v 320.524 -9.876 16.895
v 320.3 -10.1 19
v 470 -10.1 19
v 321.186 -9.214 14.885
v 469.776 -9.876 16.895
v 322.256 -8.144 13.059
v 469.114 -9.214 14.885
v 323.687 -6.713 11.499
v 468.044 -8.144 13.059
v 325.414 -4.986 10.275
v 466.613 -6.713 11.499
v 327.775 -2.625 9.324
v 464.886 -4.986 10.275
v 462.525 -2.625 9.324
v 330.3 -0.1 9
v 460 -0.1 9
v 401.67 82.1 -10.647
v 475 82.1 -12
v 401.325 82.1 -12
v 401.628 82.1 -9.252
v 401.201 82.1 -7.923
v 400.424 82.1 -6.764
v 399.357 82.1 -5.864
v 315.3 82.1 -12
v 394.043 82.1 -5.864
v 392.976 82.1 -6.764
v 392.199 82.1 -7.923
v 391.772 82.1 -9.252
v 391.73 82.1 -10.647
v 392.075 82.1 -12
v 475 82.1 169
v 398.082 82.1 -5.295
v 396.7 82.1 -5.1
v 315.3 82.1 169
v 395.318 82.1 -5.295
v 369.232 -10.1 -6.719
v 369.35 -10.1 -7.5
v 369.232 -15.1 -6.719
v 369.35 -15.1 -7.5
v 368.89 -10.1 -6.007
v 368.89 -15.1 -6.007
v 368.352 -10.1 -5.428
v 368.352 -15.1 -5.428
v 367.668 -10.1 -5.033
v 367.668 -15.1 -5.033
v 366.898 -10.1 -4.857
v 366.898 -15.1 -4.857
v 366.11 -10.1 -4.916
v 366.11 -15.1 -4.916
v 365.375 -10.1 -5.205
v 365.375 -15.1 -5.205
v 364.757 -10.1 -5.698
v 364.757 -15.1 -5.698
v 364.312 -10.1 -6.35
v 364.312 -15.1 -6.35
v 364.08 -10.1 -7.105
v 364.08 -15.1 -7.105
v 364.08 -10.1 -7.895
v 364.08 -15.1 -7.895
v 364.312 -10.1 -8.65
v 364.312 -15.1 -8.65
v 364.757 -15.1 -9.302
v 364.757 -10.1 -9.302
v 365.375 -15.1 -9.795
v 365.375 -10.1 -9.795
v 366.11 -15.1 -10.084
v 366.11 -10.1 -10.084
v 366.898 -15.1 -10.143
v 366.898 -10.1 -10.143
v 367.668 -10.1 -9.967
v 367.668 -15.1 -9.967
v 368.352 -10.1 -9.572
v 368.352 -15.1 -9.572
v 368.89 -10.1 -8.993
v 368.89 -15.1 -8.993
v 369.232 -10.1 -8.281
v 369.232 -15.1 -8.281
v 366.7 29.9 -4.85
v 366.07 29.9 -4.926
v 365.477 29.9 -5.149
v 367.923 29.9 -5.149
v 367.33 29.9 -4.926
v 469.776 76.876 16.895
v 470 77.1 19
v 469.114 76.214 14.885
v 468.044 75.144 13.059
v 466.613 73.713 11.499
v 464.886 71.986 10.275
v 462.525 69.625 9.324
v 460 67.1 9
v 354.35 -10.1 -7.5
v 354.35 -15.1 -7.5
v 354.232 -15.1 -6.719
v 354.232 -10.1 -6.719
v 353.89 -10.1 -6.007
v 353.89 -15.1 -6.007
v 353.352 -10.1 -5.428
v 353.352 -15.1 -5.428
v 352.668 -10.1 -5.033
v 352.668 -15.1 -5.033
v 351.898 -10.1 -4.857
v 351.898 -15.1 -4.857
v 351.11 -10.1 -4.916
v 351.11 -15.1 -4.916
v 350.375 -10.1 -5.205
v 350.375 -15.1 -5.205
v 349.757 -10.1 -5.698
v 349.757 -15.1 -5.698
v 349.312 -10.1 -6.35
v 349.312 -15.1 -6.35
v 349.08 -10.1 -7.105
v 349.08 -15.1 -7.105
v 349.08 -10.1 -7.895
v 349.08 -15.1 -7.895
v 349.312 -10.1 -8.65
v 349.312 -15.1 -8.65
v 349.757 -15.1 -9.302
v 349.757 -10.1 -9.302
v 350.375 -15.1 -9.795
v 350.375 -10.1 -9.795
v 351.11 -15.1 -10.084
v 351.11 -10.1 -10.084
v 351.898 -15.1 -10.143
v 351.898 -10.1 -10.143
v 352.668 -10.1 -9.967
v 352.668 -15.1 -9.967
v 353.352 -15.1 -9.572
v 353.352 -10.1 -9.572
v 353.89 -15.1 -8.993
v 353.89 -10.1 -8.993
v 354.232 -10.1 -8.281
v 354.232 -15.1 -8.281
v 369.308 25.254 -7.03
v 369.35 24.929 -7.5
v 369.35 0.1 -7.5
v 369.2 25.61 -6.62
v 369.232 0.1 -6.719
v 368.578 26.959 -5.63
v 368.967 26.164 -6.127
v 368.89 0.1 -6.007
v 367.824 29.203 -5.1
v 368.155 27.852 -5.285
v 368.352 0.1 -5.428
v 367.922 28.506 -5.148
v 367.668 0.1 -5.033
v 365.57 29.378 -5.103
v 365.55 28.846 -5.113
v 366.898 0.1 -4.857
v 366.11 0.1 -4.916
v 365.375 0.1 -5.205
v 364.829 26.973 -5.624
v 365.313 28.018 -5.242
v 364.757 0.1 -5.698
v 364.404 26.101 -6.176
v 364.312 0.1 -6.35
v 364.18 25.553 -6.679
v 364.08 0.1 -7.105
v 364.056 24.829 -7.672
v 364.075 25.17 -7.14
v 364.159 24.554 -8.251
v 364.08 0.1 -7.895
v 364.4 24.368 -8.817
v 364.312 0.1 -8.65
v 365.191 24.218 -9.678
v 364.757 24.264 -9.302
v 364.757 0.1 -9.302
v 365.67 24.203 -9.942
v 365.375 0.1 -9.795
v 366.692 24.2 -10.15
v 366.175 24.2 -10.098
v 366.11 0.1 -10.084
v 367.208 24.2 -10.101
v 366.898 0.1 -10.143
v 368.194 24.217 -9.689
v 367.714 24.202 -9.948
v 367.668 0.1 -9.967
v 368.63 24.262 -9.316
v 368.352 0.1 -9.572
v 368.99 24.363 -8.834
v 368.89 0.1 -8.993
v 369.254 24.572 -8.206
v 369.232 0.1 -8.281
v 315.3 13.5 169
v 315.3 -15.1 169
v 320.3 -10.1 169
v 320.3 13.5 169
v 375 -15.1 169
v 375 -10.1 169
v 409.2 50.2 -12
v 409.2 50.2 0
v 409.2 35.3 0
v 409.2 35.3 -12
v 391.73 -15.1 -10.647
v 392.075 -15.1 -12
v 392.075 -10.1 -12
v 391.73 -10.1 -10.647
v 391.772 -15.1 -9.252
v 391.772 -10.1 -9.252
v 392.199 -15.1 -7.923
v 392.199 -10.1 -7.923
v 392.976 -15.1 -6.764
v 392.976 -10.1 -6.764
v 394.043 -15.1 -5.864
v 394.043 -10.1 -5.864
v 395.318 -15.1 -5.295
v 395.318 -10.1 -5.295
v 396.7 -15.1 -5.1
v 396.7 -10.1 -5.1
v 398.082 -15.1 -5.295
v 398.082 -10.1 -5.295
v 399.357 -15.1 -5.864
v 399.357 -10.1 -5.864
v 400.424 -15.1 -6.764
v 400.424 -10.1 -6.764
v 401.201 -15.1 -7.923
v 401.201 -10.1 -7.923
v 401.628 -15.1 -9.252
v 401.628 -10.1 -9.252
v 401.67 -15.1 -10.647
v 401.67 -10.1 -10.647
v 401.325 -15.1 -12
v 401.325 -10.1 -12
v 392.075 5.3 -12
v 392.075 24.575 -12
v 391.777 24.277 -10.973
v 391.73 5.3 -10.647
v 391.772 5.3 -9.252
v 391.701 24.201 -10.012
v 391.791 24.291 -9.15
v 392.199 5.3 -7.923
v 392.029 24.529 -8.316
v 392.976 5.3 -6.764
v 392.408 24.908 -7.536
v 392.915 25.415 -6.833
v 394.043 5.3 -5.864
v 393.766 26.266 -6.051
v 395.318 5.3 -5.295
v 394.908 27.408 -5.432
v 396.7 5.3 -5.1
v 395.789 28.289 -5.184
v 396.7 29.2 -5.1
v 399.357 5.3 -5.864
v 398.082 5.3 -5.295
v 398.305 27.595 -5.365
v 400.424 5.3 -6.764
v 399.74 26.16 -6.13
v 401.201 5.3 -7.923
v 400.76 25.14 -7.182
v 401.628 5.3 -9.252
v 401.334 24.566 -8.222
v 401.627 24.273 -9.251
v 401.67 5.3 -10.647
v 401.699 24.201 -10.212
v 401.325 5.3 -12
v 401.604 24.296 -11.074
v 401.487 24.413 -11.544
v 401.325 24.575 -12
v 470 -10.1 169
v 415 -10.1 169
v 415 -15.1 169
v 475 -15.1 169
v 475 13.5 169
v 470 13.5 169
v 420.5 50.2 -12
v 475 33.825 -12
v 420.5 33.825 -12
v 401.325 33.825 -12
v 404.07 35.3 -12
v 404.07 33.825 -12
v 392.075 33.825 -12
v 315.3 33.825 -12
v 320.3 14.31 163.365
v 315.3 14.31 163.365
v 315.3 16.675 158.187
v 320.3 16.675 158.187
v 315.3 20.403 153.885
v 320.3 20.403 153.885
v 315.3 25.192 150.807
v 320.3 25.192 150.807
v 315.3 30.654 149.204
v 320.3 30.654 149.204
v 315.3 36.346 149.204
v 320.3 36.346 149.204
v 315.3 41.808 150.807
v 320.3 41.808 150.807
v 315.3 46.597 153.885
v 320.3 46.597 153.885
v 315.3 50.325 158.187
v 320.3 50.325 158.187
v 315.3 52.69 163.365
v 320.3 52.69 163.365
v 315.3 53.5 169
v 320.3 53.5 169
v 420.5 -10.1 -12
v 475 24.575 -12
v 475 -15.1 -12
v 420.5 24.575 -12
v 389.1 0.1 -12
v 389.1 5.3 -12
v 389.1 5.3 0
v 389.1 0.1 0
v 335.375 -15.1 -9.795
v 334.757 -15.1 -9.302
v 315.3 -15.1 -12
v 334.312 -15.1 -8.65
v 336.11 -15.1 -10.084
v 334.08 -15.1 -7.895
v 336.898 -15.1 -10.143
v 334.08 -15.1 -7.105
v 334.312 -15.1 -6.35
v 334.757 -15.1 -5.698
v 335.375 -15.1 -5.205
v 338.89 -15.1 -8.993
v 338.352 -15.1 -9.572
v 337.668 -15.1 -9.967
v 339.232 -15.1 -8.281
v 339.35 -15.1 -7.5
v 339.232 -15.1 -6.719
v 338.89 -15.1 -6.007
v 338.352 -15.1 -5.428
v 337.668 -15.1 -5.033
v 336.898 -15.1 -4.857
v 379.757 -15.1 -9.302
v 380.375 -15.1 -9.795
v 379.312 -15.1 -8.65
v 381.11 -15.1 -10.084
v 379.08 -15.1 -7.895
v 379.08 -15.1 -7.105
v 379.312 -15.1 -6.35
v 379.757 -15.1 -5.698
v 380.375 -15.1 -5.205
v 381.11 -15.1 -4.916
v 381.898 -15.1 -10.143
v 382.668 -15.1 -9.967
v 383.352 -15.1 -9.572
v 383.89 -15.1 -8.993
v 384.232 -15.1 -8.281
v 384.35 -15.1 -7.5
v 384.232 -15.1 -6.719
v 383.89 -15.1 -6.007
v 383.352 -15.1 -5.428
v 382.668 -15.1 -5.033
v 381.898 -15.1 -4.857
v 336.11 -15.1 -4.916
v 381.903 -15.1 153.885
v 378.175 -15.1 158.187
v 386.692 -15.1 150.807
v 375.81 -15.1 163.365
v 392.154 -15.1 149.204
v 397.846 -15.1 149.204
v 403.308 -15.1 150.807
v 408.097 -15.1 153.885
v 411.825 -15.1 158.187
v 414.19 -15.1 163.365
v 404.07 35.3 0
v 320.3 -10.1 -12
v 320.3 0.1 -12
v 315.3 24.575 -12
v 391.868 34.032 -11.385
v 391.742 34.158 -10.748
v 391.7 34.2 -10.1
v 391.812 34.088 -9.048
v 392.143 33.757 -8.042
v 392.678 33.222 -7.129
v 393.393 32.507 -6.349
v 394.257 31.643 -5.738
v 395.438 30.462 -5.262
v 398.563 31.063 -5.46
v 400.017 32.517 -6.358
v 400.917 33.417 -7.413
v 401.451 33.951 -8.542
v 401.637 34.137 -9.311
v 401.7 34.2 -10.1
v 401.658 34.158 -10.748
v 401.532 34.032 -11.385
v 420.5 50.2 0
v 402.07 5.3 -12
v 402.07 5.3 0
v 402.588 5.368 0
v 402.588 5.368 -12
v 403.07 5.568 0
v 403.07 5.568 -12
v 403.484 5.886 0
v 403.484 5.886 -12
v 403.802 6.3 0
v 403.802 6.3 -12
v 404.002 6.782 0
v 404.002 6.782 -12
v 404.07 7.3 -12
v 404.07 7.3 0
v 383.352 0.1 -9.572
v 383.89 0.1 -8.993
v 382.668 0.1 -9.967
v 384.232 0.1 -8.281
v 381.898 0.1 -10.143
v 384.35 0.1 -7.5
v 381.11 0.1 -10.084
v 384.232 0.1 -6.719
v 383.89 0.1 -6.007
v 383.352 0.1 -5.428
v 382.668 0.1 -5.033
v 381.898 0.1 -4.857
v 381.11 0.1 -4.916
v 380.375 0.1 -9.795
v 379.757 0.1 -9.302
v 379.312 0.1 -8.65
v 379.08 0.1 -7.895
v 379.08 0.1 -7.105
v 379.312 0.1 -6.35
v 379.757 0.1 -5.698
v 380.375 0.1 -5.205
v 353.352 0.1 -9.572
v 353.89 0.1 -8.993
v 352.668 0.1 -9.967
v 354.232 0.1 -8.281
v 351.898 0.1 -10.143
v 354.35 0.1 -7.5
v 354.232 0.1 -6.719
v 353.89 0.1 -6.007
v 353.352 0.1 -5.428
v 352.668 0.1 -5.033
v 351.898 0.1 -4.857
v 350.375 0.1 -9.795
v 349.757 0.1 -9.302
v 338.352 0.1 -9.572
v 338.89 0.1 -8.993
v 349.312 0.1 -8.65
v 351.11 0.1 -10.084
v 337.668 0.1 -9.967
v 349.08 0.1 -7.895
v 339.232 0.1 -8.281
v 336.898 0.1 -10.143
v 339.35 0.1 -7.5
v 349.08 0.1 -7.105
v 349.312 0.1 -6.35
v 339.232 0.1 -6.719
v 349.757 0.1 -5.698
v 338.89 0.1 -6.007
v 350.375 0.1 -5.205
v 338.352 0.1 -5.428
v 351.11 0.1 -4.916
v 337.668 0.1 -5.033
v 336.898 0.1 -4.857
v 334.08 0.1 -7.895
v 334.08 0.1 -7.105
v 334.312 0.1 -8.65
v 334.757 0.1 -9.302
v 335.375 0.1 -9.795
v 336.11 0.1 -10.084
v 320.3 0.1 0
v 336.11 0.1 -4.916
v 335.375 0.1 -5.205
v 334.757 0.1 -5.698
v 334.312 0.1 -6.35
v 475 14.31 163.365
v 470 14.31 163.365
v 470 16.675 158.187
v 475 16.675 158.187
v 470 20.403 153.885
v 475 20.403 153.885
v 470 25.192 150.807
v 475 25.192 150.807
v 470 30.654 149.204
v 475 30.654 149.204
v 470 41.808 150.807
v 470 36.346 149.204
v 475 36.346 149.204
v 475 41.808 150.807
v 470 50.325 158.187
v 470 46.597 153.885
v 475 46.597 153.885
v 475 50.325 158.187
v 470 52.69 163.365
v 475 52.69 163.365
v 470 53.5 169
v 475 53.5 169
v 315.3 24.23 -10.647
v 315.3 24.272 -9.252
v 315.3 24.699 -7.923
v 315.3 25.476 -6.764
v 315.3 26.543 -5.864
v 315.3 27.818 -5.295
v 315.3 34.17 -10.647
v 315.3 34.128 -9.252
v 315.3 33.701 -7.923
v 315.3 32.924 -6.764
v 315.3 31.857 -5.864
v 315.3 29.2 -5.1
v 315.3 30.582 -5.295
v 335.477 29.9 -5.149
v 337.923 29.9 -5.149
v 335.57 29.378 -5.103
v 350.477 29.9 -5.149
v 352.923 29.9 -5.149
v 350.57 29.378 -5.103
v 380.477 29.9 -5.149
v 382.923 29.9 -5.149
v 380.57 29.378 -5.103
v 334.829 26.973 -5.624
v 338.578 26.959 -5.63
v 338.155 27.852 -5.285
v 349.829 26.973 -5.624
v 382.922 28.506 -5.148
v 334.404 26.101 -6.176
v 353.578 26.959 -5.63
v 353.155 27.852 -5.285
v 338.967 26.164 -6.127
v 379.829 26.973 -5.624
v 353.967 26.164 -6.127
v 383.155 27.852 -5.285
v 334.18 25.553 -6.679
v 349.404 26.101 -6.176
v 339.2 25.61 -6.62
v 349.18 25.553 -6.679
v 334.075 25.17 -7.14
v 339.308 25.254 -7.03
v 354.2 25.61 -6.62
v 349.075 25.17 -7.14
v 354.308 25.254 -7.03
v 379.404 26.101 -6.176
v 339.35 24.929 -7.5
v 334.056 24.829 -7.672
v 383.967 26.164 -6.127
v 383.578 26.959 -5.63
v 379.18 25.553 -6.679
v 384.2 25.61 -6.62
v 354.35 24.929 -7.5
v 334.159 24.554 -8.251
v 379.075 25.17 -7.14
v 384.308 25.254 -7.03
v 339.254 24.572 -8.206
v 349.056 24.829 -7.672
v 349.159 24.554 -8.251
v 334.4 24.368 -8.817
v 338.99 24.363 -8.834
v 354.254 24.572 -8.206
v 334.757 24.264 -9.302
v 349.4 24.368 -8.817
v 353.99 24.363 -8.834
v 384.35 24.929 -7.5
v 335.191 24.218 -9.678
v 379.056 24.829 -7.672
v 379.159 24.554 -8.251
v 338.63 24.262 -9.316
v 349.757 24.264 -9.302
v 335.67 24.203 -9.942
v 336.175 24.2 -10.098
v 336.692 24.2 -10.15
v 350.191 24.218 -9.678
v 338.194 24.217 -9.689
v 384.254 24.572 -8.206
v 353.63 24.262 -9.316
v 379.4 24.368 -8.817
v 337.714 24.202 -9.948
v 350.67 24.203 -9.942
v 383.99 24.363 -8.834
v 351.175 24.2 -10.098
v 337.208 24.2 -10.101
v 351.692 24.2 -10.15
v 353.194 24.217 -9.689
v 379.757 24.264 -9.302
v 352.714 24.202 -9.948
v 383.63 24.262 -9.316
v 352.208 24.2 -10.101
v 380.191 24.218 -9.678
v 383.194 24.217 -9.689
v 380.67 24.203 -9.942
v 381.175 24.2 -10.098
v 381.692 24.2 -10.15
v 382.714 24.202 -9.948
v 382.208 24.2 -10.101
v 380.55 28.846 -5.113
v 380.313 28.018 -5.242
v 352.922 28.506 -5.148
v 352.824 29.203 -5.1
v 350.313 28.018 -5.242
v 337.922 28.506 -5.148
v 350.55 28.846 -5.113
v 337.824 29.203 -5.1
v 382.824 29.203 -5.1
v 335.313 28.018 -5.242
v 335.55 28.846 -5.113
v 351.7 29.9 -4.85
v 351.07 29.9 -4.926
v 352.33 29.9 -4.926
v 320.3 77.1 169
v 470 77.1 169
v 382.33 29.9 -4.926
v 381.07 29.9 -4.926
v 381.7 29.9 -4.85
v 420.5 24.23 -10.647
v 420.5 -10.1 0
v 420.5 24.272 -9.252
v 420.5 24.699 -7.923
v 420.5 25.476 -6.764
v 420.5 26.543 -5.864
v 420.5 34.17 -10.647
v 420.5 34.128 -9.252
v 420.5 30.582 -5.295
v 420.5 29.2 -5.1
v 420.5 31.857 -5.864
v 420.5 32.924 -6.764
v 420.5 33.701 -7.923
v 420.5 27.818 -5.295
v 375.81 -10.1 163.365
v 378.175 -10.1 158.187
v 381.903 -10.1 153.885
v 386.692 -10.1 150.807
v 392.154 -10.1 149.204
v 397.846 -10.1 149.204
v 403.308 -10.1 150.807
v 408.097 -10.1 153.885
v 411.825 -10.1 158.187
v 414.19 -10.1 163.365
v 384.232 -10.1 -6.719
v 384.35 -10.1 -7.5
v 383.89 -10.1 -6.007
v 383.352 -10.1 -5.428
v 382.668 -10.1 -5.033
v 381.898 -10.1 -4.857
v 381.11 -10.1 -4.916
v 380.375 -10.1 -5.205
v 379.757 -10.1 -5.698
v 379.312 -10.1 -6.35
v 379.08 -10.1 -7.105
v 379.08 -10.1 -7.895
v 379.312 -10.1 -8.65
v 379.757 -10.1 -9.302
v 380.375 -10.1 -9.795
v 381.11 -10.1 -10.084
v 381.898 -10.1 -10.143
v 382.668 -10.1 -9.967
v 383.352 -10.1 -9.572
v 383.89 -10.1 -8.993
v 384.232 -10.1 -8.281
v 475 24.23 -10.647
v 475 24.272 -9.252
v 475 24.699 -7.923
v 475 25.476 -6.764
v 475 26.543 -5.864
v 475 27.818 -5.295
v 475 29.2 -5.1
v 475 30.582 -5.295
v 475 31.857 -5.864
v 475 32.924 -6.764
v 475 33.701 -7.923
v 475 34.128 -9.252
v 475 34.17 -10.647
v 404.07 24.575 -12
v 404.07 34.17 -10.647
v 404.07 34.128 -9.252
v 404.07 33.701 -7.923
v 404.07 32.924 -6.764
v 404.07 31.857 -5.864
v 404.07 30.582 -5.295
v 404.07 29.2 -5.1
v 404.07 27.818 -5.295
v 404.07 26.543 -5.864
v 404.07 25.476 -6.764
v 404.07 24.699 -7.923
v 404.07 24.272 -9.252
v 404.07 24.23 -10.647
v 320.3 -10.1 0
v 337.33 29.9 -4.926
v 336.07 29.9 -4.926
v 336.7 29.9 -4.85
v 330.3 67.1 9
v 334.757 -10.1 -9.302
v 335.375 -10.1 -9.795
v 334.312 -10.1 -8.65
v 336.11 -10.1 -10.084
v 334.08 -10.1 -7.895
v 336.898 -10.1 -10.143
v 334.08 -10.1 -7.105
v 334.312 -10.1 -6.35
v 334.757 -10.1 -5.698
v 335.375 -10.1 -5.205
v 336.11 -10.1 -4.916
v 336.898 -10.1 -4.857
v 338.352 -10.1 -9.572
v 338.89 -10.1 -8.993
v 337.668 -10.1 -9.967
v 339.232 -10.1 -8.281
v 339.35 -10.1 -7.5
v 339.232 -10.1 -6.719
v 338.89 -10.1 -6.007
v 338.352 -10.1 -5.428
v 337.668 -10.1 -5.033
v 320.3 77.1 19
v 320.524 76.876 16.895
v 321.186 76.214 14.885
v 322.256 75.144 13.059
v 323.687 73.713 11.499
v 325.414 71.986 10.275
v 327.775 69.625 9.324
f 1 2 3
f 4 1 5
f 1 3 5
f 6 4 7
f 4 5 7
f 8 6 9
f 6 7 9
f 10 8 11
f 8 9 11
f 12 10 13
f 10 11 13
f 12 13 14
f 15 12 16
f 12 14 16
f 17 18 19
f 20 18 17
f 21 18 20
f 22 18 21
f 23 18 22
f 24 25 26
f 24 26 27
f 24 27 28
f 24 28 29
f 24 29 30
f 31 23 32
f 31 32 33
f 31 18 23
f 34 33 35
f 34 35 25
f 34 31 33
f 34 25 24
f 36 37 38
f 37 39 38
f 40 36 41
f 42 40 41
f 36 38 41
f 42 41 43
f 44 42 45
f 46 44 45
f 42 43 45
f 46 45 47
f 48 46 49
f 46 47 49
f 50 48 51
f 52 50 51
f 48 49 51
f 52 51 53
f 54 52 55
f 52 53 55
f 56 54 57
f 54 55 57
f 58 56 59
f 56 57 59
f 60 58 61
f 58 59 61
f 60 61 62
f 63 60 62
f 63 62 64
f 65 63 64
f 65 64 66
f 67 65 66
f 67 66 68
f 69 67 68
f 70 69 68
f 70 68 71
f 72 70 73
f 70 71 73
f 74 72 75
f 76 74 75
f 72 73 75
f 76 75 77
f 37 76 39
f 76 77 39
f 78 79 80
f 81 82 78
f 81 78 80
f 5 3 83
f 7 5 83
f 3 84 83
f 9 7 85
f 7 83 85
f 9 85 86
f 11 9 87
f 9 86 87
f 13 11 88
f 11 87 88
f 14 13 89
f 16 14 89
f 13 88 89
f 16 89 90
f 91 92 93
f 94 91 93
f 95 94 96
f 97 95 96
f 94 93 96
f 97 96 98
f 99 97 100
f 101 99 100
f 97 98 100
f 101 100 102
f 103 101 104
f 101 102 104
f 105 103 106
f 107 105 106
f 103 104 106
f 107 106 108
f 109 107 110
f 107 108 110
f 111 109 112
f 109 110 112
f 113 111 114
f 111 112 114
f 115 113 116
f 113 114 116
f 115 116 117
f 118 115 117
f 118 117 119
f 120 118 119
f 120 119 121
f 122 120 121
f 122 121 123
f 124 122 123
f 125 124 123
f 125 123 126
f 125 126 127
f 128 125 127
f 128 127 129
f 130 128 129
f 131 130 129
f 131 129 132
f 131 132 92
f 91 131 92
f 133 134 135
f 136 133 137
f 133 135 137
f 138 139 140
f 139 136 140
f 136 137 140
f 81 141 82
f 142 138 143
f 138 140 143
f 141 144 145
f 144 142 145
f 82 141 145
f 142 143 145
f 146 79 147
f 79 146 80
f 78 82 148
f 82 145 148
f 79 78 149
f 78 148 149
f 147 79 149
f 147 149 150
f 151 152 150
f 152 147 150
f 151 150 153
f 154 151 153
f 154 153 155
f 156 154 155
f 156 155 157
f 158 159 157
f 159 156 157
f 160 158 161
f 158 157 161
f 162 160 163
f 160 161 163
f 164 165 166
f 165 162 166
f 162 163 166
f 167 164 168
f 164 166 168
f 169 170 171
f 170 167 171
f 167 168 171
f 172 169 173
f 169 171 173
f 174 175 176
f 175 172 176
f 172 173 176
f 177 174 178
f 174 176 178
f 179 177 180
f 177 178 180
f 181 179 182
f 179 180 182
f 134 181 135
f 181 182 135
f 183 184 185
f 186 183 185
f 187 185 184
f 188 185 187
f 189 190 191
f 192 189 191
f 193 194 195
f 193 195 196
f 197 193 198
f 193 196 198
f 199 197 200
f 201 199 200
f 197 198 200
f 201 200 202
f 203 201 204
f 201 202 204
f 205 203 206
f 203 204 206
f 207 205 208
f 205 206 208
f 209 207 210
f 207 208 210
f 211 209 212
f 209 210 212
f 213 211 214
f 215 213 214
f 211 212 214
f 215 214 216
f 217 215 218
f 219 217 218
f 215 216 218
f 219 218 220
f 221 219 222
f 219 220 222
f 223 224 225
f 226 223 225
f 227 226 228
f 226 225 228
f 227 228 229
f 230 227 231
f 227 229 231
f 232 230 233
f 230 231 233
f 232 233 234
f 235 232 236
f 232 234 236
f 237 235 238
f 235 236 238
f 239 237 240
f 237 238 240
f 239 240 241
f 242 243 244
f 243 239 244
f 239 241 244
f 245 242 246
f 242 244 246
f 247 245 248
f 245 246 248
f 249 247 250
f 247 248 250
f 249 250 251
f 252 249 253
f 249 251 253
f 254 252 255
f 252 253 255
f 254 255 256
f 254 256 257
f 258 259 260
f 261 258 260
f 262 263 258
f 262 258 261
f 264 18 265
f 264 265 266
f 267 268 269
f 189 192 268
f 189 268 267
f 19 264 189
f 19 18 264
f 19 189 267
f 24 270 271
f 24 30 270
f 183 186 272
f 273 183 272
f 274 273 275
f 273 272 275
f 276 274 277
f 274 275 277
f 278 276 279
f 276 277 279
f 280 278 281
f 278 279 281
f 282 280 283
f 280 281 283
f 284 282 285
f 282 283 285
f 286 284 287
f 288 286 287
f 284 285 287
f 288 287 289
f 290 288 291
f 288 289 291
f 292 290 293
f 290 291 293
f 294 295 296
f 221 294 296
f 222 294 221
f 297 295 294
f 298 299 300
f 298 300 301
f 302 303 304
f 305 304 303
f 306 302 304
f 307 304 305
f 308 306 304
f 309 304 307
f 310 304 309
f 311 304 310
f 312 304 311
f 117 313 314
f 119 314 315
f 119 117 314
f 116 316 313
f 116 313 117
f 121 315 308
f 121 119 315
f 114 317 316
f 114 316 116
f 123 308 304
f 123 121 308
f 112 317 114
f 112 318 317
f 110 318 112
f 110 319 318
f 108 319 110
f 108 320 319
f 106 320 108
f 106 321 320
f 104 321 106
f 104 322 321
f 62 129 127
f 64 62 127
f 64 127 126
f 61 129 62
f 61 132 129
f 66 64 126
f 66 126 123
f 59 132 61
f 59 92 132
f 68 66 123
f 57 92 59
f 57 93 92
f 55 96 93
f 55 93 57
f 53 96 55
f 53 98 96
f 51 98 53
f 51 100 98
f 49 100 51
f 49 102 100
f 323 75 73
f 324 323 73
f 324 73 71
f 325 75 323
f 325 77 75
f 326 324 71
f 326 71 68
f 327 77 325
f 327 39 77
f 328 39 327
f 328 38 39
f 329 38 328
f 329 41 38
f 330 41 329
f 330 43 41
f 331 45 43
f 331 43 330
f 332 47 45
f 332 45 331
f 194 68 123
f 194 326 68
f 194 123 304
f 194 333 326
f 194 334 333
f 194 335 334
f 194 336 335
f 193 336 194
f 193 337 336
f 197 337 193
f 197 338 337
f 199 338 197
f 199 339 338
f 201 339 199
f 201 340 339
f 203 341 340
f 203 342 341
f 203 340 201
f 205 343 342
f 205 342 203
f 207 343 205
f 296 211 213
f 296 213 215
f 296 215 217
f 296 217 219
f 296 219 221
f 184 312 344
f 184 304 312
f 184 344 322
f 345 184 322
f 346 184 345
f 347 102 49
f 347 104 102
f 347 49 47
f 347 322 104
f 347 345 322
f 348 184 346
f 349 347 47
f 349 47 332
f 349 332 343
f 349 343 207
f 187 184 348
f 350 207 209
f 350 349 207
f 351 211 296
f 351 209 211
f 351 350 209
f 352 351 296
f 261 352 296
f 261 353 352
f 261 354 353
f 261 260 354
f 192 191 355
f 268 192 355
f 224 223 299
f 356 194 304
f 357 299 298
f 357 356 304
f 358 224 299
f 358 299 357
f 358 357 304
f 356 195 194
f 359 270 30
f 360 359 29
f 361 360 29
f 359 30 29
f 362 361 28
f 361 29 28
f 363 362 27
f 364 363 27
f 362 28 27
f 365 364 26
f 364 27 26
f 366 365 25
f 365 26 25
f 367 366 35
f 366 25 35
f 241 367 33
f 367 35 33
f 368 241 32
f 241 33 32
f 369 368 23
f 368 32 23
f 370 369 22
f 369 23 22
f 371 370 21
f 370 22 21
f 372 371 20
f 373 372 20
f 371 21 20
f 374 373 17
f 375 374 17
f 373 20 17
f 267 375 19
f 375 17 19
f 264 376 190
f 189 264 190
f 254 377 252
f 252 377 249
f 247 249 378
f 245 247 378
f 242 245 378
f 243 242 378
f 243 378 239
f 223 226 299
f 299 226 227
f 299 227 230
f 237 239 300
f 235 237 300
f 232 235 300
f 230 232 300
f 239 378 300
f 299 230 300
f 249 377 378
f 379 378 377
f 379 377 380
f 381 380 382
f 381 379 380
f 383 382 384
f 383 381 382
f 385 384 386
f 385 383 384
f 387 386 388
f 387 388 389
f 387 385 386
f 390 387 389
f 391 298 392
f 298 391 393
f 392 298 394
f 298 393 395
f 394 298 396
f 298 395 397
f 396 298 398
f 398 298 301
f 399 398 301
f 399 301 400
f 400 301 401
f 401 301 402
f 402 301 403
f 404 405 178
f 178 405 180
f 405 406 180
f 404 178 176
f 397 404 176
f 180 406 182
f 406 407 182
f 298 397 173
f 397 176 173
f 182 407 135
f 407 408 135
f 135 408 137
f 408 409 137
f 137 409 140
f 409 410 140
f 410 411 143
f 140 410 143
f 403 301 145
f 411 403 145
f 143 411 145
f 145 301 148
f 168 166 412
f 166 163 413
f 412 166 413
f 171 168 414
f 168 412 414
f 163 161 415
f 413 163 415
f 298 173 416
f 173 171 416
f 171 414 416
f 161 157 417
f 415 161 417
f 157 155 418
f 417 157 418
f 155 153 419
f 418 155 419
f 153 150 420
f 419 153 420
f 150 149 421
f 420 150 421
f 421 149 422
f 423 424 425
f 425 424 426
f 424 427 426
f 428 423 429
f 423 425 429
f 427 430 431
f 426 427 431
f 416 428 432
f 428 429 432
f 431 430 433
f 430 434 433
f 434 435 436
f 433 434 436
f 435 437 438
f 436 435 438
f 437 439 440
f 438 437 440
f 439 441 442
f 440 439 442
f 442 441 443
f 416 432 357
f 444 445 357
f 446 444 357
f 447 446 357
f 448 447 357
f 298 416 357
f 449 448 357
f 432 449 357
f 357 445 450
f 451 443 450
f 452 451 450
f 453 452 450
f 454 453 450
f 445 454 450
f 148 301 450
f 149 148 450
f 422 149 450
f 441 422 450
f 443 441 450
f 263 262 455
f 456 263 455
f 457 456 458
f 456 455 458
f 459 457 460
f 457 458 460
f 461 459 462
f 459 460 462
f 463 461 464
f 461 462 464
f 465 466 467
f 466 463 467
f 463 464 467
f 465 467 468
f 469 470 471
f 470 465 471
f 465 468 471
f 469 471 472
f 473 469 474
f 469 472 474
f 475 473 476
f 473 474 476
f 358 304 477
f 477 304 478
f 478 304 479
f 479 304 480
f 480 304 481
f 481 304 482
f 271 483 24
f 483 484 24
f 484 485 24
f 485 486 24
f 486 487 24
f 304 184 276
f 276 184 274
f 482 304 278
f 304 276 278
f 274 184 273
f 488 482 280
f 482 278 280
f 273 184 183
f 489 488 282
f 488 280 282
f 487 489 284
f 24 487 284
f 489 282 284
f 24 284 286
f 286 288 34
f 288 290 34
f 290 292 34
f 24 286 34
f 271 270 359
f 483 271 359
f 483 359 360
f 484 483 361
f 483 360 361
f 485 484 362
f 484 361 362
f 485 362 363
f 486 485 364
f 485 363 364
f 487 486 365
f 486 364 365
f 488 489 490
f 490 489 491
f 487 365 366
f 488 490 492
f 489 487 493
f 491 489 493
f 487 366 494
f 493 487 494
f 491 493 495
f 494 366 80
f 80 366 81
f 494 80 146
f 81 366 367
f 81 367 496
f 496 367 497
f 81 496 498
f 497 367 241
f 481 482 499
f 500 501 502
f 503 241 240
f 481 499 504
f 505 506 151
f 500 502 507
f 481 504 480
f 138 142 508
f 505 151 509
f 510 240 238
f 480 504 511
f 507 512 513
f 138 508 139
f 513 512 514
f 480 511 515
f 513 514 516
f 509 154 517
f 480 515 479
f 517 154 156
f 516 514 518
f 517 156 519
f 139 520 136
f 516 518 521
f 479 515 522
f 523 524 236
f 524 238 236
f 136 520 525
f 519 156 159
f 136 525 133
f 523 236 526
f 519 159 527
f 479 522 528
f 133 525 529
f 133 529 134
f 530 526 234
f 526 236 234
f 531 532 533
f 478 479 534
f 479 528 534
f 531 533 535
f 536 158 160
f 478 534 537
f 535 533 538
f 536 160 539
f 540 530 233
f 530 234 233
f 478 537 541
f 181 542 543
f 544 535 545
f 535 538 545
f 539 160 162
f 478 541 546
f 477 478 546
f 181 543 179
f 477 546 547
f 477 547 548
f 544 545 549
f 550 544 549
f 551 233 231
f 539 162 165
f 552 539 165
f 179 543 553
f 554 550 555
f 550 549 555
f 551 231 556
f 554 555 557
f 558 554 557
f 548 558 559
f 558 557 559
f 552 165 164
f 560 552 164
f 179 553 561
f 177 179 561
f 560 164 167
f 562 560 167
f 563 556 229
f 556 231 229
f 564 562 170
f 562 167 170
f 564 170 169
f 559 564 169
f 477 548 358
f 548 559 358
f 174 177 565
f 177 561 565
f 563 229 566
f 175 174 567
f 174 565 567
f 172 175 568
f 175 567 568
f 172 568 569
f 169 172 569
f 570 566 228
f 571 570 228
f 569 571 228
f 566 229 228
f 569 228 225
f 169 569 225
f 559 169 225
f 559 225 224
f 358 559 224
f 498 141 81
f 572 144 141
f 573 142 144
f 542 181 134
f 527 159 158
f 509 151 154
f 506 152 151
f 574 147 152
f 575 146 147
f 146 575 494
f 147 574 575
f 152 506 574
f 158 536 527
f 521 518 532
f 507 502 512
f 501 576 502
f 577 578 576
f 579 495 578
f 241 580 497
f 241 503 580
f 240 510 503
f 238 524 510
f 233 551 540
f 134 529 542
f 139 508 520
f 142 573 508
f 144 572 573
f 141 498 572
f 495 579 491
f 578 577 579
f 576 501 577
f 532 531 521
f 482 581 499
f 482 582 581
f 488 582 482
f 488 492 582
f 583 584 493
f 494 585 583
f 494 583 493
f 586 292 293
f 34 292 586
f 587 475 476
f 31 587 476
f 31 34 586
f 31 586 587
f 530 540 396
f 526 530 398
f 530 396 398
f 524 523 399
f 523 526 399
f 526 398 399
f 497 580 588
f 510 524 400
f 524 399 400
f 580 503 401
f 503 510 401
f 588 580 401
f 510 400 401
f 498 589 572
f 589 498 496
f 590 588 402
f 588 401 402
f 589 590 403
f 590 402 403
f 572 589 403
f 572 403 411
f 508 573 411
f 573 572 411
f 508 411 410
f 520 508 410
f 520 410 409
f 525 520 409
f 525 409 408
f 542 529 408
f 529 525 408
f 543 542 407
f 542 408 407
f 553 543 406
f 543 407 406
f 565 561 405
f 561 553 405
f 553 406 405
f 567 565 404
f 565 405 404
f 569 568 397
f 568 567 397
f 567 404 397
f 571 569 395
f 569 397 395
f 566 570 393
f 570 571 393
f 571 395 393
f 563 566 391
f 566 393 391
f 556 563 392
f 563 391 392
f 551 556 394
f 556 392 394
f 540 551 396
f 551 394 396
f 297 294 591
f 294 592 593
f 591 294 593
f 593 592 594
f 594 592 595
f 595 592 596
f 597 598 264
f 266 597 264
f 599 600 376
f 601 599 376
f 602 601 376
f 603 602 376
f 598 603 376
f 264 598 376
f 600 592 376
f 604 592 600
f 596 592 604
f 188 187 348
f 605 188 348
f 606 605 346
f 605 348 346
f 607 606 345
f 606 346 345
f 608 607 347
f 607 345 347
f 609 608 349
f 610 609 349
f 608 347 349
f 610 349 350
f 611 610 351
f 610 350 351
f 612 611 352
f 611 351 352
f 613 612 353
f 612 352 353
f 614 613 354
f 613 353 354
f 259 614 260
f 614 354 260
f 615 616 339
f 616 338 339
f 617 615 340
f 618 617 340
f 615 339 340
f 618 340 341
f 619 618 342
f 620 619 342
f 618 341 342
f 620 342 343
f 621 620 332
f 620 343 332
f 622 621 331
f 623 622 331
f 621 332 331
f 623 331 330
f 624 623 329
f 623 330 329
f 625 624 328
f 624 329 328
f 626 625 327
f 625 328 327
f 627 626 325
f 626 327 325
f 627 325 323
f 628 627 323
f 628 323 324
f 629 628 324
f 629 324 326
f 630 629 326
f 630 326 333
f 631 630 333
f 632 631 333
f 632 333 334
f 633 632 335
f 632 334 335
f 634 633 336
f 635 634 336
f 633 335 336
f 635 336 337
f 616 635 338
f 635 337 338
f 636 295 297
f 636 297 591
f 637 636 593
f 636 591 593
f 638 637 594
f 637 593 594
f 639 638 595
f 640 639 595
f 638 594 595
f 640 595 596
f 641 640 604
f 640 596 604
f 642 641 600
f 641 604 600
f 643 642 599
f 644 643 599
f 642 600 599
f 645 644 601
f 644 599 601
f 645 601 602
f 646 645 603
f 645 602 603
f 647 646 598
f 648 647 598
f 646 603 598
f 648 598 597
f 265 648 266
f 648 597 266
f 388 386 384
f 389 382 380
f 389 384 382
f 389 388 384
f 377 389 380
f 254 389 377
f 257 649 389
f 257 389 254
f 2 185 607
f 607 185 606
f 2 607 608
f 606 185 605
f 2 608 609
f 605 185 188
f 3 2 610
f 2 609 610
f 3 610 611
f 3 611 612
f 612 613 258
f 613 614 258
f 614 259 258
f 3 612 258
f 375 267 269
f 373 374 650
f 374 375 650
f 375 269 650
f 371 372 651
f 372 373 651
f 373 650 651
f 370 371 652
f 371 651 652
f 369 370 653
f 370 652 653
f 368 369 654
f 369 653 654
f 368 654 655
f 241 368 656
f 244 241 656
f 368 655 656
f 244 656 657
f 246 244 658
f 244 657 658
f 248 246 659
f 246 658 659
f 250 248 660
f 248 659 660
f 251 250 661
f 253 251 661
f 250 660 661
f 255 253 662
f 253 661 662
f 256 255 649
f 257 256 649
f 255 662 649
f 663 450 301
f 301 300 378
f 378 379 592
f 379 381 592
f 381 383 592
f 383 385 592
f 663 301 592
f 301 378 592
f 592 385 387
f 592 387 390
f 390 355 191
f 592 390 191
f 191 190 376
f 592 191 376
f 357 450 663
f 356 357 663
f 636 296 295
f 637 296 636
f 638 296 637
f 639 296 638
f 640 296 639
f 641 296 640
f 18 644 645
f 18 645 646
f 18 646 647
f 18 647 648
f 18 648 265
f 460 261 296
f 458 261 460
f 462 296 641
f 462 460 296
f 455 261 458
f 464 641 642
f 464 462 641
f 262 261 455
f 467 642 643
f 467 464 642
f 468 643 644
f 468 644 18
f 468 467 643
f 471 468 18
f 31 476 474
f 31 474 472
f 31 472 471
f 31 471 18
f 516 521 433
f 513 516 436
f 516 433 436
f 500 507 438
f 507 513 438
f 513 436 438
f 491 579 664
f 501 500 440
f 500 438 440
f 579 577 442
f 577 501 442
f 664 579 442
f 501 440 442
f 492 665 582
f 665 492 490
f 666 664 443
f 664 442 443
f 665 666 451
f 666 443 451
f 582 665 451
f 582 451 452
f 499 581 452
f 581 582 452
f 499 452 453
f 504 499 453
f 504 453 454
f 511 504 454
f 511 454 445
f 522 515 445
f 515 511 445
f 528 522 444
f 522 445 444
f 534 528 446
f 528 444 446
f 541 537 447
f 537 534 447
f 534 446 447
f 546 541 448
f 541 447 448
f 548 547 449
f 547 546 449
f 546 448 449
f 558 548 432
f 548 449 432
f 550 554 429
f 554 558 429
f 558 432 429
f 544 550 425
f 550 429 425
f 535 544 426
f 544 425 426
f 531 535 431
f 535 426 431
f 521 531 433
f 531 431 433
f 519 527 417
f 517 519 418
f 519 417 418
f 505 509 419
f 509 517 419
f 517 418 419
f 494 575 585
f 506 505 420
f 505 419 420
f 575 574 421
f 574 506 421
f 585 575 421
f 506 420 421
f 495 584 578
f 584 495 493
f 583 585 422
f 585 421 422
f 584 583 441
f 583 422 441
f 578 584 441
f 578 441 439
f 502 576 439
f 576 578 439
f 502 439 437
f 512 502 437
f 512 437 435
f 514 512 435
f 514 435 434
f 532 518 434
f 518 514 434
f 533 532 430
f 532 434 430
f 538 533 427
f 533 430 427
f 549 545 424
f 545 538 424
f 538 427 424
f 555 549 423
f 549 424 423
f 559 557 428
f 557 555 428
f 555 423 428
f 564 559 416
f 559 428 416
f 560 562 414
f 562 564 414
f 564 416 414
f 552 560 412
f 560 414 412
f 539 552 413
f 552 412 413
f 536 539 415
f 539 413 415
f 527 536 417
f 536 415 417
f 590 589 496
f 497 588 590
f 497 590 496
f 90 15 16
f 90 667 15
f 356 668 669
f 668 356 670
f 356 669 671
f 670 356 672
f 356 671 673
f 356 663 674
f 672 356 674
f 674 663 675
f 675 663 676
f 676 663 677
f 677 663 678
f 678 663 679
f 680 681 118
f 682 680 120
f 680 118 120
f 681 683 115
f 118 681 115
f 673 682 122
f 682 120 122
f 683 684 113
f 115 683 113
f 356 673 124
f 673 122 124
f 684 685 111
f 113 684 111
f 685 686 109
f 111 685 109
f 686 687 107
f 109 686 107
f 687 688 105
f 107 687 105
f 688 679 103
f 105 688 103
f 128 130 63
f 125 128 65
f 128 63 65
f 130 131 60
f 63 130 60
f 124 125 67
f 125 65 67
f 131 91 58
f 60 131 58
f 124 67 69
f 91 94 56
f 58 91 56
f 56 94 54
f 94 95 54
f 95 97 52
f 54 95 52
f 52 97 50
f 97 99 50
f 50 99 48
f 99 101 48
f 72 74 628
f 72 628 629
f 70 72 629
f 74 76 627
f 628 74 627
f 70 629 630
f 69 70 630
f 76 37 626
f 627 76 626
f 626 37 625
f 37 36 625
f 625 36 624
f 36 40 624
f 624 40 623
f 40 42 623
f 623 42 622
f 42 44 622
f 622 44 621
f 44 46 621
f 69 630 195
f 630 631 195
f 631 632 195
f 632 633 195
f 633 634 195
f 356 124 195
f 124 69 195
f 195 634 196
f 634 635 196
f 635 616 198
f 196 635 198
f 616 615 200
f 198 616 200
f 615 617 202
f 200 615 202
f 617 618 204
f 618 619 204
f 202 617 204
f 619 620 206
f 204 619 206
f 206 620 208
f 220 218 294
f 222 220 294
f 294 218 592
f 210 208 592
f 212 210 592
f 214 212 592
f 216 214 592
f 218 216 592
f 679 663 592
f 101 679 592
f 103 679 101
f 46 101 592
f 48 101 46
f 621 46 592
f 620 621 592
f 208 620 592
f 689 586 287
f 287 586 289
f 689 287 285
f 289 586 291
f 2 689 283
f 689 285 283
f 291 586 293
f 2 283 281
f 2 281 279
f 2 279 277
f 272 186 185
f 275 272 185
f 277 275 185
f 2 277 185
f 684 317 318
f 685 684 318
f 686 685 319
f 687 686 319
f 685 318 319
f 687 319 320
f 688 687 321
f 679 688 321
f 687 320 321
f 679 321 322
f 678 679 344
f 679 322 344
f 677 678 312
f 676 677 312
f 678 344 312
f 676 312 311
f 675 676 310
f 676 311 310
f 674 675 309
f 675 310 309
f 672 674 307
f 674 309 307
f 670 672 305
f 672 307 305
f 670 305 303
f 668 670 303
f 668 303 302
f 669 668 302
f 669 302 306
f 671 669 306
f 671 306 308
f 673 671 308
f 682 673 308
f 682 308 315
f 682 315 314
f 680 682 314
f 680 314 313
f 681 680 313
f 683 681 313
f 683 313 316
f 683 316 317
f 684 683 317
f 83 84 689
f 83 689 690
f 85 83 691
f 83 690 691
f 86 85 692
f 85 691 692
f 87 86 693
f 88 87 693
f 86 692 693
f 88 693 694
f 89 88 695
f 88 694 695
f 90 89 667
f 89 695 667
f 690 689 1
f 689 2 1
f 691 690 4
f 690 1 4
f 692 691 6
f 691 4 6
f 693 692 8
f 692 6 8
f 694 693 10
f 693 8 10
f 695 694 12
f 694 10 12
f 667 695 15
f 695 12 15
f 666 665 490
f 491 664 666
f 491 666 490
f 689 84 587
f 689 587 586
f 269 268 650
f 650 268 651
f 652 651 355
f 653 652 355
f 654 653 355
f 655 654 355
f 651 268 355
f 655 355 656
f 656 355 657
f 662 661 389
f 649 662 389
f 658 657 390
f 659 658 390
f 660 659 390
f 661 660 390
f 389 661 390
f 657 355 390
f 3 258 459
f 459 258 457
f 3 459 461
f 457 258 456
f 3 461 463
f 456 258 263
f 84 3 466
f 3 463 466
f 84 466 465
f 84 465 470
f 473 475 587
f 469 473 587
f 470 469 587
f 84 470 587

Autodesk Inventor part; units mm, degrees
ref_plane "YZ Plane" through (0, 0, 0) normal (1, 0, 0) x (0, 1, 0)
ref_plane "XZ Plane" through (0, 0, 0) normal (0, 1, 0) x (-1, 0, 0)
sketch "Sketch1" plane through (0, 0, 0) normal (0, 0, 1) x (1, 0, 0)
  line L0 (320.4, 0) -> (420.4, 0) construction
  line L1 (420.4, 0) -> (420.4, -10) construction
  line L2 (320.4, -10) -> (420.4, -10) construction
  line L3 (320.4, 0) -> (320.4, -10) construction
  line L4 (409.3, 0.1) -> (409.3, 50.1) construction
  line L5 (420.4, 0.1) -> (409.3, 0.1) construction
  line L6 (420.4, 50.1) -> (420.4, 0.1) construction
  line L7 (409.3, 50.1) -> (420.4, 50.1) construction
  line L8 (420.5, 50.2) -> (409.2, 50.2)
  line L9 (409.2, 50.2) -> (409.2, 35.3)
  line L10 (409.2, 35.3) -> (404.07, 35.3)
  line L11 (404.07, 35.3) -> (404.07, 7.3)
  line L12 (402.07, 5.3) -> (389.1, 5.3)
  line L13 (389.1, 5.3) -> (389.1, 0.1)
  line L14 (389.1, 0.1) -> (320.3, 0.1)
  line L15 (320.3, 0.1) -> (320.3, -10.1)
  line L16 (320.3, -10.1) -> (420.5, -10.1)
  line L17 (420.5, -10.1) -> (420.5, 50.2)
  arc A0 (402.07, 5.3) -> (404.07, 7.3) centre (402.07, 7.3) ccw
  line L18 (315.3, 5.1) -> (384.1, 5.1)
  line L19 (384.1, 5.1) -> (384.1, 10.3)
  line L20 (384.1, 10.3) -> (399.07, 10.3)
  line L21 (399.07, 10.3) -> (399.07, 40.3)
  line L22 (399.07, 40.3) -> (404.2, 40.3)
  line L23 (404.2, 40.3) -> (404.2, 55.2)
  line L24 (404.2, 55.2) -> (425.5, 55.2)
  line L25 (425.5, 55.2) -> (425.5, -15.1)
  line L26 (425.5, -15.1) -> (315.3, -15.1)
  line L27 (315.3, -15.1) -> (315.3, 5.1)
  line L28 (404.2, 7.2) -> (404.2, 35.2) projected
  arc A1 (402.2, 5.2) -> (404.2, 7.2) centre (402.2, 7.2) ccw projected
  line L29 (389.2, 5.2) -> (402.2, 5.2) projected
  line L30 (389.2, 0.2) -> (389.2, 5.2) projected
  line L31 (409.2, 0.2) -> (389.2, 0.2) projected
  line L32 (409.2, 35.2) -> (409.2, 0.2) projected
  line L33 (404.2, 35.2) -> (409.2, 35.2) projected
  point P0 (0, 0)
  dimension "d0" = 0.1
  dimension "d1" = 0.1
  dimension "d2" = 0.1
  dimension "d6" = 2
  dimension "d8" = 0.1
  dimension "d9" = 0.1
  dimension "d10" = 0.1
  dimension "d11" = 5
  dimension "d72" = 0.1
  dimension "d73" = 0.1
  dimension "d74" = 0.13
  dimension "d75" = 0.1
extrude "Extrusion1" add sketch "Sketch1" against normal blind 12 contours L18 L19 L20 L21 L22 L23 L24 L25 L26 L27
sketch "Sketch4" plane through (0, 0, 0) normal (0, 0, 1) x (1, 0, 0)
  line L0 (194.6531, 87.1) -> (247.6531, 87.1) projected
  line L1 (315.3, 82.1) -> (475, 82.1)
  line L2 (475, -15.1) -> (315.3, -15.1)
  line L3 (315.3, -15.1) -> (315.3, 82.1)
  line L4 (315.3, -15.1) -> (425.5, -15.1) projected
  line L5 (315.3, 5.1) -> (315.3, -15.1) projected
  line L6 (475, 9.2) -> (475, 65.2) projected
  line L7 (475, -15.1) -> (475, 82.1)
  point P0 (0, 0)
  dimension "d66" = 5
extrude "Extrusion4" add sketch "Sketch4" along normal blind 169
sketch "Sketch5" plane through (0, 0, 169) normal (0, 0, 1) x (1, 0, 0)
  line L0 (315.3, 82.1) -> (315.3, -15.1) projected
  line L1 (315.3, -15.1) -> (475, -15.1) projected
  line L2 (475, -15.1) -> (475, 82.1) projected
  line L3 (475, 82.1) -> (315.3, 82.1) projected
  line L4 (320.3, 77.1) -> (320.3, -10.1)
  line L5 (320.3, -10.1) -> (470, -10.1)
  line L6 (470, -10.1) -> (470, 77.1)
  line L7 (470, 77.1) -> (320.3, 77.1)
  point P0 (0, 0)
  dimension "d26" = 5
extrude "Extrusion5" cut sketch "Sketch5" against normal blind 160 contours L7 L6 L5 L4
sketch "Sketch6" plane through (0, 0, 0) normal (0, 0, -1) x (-1, 0, 0)
  line L0 (-384.1, 5.1) -> (-315.3, 5.1) projected
  line L1 (-315.3, 82.1) -> (-315.3, 5.1) projected
  line L2 (-475, 82.1) -> (-315.3, 82.1) projected
  line L3 (-475, -15.1) -> (-475, 82.1) projected
  line L4 (-425.5, -15.1) -> (-475, -15.1) projected
  line L5 (-425.5, -15.1) -> (-425.5, 55.2) projected
  line L6 (-425.5, 55.2) -> (-404.2, 55.2) projected
  line L7 (-404.2, 55.2) -> (-404.2, 40.3) projected
  line L8 (-404.2, 40.3) -> (-399.07, 40.3) projected
  line L9 (-399.07, 40.3) -> (-399.07, 10.3) projected
  line L10 (-399.07, 10.3) -> (-384.1, 10.3) projected
  line L11 (-384.1, 10.3) -> (-384.1, 5.1) projected
  point P0 (0, 0)
extrude "Extrusion6" add sketch "Sketch6" along normal up to surface (12 mm away)
sketch "Sketch7" plane through (315.3, 82.1, 169) normal (0, 1, 0) x (1, 0, 0)
  circle A0 centre (81.4, 179.1) radius 5
  circle A1 centre (36.4, 176.6) radius 2.5 construction
  circle A2 centre (51.4, 176.6) radius 2.5 construction
  circle A3 centre (21.4, 176.6) radius 2.5 construction
  circle A4 centre (66.4, 176.6) radius 2.5 construction
  circle A5 centre (81.4, 179.1) radius 2.5 construction
  circle A6 centre (81.4, 194.1) radius 2.5 construction
  circle A7 centre (81.4, 209.1) radius 2.5 construction
  line L0 (5.1, 169.1) -> (5.1, 312.15) construction
  line L1 (5.1, 312.15) -> (105.1, 312.15) construction
  line L2 (105.1, 312.15) -> (105.1, 169.1) construction
  line L3 (105.1, 169.1) -> (5.1, 169.1) construction
  circle A8 centre (10.1, 282.25) radius 2.15 construction
  circle A9 centre (10.1, 302.15) radius 2.15 construction
  circle A10 centre (88.9, 302.15) radius 2.15 construction
  circle A11 centre (88.9, 282.25) radius 2.15 construction
  circle A12 centre (99.55, 189.1) radius 2.65 construction
  circle A13 centre (99.55, 209.1) radius 2.65 construction
  circle A14 centre (99.55, 229.1) radius 2.65 construction
  circle A15 centre (99.55, 249.1) radius 2.65 construction
  point P0 (-315.3, 169)
  dimension "d71" = 10
ref_plane "Work Plane2" through (389.2, 5.1, -50.1) normal (0, 1, 0) x (0, 0, 1)
extrude "Extrusion7" cut sketch "Sketch7" against normal through all
sketch "Sketch8" plane through (404.07, 7.3, -12) normal (1, 0, 0) x (0, 0, -1)
  circle A0 centre (-1.9, 21.9) radius 2.5 construction
  circle A1 centre (-1.9, 21.9) radius 2.5 construction
  circle A2 centre (-1.9, 21.9) radius 5
  point P0 (-12, -7.3)
  dimension "d34" = 10
extrude "Extrusion8" cut sketch "Sketch8" along normal through all both and the other way through all
sketch "Sketch9" plane through (315.3, -15.1, 169) normal (0, -1, 0) x (1, 0, 0)
  circle A0 centre (81.4, -179.1) radius 3.0567 construction
  line L0 (107.734, -169) -> (7.734, -169) construction
  circle A1 centre (66.4, -176.5) radius 2.65
  circle A2 centre (51.4, -176.5) radius 2.65
  circle A3 centre (36.4, -176.5) radius 2.65
  circle A4 centre (21.4, -176.5) radius 2.65
  line L1 (105.2, -169) -> (5, -169) construction
  circle A5 centre (81.4, -179.1) radius 2.5 construction
  point P0 (-315.3, -169)
  dimension "d37" = 5.3
  dimension "d38" = 7.5
  dimension "d39" = 15
  dimension "d42" = 15
extrude "Extrusion9" cut sketch "Sketch9" against normal blind 45
sketch "Sketch10" plane through (475, -15.1, 169) normal (1, 0, 0) x (0, 0, -1)
  circle A0 centre (0, 48.6) radius 20
  line L0 (0, 48.6) -> (279.056, 48.6) construction
  line L1 (0, 0) -> (0, 97.2) projected
  point P0 (169, 15.1)
  dimension "d49" = 40
extrude "Extrusion10" cut sketch "Sketch10" against normal through all
fillet "Fillet2" radius 10 4 edges at (395.15, -10.1, 9) (470, 33.5, 9) (395.15, 77.1, 9) (320.3, 33.5, 9)
sketch "Sketch13" plane through (315.3, -15.1, 169) normal (0, -1, 0) x (1, 0, 0)
  line L0 (0, 0) -> (159.7, 0) projected
  circle A0 centre (79.7, 0) radius 20
  point P0 (-315.3, -169)
  point P1 (99.7, 0)
  point P2 (59.7, 0)
  dimension "d77" = 40
  dimension "d78" = 80
extrude "Extrusion13" cut sketch "Sketch13" against normal up to next contours L0 A0 picked at (83.4871, -5.4866)
properties part number "Lower Support"
